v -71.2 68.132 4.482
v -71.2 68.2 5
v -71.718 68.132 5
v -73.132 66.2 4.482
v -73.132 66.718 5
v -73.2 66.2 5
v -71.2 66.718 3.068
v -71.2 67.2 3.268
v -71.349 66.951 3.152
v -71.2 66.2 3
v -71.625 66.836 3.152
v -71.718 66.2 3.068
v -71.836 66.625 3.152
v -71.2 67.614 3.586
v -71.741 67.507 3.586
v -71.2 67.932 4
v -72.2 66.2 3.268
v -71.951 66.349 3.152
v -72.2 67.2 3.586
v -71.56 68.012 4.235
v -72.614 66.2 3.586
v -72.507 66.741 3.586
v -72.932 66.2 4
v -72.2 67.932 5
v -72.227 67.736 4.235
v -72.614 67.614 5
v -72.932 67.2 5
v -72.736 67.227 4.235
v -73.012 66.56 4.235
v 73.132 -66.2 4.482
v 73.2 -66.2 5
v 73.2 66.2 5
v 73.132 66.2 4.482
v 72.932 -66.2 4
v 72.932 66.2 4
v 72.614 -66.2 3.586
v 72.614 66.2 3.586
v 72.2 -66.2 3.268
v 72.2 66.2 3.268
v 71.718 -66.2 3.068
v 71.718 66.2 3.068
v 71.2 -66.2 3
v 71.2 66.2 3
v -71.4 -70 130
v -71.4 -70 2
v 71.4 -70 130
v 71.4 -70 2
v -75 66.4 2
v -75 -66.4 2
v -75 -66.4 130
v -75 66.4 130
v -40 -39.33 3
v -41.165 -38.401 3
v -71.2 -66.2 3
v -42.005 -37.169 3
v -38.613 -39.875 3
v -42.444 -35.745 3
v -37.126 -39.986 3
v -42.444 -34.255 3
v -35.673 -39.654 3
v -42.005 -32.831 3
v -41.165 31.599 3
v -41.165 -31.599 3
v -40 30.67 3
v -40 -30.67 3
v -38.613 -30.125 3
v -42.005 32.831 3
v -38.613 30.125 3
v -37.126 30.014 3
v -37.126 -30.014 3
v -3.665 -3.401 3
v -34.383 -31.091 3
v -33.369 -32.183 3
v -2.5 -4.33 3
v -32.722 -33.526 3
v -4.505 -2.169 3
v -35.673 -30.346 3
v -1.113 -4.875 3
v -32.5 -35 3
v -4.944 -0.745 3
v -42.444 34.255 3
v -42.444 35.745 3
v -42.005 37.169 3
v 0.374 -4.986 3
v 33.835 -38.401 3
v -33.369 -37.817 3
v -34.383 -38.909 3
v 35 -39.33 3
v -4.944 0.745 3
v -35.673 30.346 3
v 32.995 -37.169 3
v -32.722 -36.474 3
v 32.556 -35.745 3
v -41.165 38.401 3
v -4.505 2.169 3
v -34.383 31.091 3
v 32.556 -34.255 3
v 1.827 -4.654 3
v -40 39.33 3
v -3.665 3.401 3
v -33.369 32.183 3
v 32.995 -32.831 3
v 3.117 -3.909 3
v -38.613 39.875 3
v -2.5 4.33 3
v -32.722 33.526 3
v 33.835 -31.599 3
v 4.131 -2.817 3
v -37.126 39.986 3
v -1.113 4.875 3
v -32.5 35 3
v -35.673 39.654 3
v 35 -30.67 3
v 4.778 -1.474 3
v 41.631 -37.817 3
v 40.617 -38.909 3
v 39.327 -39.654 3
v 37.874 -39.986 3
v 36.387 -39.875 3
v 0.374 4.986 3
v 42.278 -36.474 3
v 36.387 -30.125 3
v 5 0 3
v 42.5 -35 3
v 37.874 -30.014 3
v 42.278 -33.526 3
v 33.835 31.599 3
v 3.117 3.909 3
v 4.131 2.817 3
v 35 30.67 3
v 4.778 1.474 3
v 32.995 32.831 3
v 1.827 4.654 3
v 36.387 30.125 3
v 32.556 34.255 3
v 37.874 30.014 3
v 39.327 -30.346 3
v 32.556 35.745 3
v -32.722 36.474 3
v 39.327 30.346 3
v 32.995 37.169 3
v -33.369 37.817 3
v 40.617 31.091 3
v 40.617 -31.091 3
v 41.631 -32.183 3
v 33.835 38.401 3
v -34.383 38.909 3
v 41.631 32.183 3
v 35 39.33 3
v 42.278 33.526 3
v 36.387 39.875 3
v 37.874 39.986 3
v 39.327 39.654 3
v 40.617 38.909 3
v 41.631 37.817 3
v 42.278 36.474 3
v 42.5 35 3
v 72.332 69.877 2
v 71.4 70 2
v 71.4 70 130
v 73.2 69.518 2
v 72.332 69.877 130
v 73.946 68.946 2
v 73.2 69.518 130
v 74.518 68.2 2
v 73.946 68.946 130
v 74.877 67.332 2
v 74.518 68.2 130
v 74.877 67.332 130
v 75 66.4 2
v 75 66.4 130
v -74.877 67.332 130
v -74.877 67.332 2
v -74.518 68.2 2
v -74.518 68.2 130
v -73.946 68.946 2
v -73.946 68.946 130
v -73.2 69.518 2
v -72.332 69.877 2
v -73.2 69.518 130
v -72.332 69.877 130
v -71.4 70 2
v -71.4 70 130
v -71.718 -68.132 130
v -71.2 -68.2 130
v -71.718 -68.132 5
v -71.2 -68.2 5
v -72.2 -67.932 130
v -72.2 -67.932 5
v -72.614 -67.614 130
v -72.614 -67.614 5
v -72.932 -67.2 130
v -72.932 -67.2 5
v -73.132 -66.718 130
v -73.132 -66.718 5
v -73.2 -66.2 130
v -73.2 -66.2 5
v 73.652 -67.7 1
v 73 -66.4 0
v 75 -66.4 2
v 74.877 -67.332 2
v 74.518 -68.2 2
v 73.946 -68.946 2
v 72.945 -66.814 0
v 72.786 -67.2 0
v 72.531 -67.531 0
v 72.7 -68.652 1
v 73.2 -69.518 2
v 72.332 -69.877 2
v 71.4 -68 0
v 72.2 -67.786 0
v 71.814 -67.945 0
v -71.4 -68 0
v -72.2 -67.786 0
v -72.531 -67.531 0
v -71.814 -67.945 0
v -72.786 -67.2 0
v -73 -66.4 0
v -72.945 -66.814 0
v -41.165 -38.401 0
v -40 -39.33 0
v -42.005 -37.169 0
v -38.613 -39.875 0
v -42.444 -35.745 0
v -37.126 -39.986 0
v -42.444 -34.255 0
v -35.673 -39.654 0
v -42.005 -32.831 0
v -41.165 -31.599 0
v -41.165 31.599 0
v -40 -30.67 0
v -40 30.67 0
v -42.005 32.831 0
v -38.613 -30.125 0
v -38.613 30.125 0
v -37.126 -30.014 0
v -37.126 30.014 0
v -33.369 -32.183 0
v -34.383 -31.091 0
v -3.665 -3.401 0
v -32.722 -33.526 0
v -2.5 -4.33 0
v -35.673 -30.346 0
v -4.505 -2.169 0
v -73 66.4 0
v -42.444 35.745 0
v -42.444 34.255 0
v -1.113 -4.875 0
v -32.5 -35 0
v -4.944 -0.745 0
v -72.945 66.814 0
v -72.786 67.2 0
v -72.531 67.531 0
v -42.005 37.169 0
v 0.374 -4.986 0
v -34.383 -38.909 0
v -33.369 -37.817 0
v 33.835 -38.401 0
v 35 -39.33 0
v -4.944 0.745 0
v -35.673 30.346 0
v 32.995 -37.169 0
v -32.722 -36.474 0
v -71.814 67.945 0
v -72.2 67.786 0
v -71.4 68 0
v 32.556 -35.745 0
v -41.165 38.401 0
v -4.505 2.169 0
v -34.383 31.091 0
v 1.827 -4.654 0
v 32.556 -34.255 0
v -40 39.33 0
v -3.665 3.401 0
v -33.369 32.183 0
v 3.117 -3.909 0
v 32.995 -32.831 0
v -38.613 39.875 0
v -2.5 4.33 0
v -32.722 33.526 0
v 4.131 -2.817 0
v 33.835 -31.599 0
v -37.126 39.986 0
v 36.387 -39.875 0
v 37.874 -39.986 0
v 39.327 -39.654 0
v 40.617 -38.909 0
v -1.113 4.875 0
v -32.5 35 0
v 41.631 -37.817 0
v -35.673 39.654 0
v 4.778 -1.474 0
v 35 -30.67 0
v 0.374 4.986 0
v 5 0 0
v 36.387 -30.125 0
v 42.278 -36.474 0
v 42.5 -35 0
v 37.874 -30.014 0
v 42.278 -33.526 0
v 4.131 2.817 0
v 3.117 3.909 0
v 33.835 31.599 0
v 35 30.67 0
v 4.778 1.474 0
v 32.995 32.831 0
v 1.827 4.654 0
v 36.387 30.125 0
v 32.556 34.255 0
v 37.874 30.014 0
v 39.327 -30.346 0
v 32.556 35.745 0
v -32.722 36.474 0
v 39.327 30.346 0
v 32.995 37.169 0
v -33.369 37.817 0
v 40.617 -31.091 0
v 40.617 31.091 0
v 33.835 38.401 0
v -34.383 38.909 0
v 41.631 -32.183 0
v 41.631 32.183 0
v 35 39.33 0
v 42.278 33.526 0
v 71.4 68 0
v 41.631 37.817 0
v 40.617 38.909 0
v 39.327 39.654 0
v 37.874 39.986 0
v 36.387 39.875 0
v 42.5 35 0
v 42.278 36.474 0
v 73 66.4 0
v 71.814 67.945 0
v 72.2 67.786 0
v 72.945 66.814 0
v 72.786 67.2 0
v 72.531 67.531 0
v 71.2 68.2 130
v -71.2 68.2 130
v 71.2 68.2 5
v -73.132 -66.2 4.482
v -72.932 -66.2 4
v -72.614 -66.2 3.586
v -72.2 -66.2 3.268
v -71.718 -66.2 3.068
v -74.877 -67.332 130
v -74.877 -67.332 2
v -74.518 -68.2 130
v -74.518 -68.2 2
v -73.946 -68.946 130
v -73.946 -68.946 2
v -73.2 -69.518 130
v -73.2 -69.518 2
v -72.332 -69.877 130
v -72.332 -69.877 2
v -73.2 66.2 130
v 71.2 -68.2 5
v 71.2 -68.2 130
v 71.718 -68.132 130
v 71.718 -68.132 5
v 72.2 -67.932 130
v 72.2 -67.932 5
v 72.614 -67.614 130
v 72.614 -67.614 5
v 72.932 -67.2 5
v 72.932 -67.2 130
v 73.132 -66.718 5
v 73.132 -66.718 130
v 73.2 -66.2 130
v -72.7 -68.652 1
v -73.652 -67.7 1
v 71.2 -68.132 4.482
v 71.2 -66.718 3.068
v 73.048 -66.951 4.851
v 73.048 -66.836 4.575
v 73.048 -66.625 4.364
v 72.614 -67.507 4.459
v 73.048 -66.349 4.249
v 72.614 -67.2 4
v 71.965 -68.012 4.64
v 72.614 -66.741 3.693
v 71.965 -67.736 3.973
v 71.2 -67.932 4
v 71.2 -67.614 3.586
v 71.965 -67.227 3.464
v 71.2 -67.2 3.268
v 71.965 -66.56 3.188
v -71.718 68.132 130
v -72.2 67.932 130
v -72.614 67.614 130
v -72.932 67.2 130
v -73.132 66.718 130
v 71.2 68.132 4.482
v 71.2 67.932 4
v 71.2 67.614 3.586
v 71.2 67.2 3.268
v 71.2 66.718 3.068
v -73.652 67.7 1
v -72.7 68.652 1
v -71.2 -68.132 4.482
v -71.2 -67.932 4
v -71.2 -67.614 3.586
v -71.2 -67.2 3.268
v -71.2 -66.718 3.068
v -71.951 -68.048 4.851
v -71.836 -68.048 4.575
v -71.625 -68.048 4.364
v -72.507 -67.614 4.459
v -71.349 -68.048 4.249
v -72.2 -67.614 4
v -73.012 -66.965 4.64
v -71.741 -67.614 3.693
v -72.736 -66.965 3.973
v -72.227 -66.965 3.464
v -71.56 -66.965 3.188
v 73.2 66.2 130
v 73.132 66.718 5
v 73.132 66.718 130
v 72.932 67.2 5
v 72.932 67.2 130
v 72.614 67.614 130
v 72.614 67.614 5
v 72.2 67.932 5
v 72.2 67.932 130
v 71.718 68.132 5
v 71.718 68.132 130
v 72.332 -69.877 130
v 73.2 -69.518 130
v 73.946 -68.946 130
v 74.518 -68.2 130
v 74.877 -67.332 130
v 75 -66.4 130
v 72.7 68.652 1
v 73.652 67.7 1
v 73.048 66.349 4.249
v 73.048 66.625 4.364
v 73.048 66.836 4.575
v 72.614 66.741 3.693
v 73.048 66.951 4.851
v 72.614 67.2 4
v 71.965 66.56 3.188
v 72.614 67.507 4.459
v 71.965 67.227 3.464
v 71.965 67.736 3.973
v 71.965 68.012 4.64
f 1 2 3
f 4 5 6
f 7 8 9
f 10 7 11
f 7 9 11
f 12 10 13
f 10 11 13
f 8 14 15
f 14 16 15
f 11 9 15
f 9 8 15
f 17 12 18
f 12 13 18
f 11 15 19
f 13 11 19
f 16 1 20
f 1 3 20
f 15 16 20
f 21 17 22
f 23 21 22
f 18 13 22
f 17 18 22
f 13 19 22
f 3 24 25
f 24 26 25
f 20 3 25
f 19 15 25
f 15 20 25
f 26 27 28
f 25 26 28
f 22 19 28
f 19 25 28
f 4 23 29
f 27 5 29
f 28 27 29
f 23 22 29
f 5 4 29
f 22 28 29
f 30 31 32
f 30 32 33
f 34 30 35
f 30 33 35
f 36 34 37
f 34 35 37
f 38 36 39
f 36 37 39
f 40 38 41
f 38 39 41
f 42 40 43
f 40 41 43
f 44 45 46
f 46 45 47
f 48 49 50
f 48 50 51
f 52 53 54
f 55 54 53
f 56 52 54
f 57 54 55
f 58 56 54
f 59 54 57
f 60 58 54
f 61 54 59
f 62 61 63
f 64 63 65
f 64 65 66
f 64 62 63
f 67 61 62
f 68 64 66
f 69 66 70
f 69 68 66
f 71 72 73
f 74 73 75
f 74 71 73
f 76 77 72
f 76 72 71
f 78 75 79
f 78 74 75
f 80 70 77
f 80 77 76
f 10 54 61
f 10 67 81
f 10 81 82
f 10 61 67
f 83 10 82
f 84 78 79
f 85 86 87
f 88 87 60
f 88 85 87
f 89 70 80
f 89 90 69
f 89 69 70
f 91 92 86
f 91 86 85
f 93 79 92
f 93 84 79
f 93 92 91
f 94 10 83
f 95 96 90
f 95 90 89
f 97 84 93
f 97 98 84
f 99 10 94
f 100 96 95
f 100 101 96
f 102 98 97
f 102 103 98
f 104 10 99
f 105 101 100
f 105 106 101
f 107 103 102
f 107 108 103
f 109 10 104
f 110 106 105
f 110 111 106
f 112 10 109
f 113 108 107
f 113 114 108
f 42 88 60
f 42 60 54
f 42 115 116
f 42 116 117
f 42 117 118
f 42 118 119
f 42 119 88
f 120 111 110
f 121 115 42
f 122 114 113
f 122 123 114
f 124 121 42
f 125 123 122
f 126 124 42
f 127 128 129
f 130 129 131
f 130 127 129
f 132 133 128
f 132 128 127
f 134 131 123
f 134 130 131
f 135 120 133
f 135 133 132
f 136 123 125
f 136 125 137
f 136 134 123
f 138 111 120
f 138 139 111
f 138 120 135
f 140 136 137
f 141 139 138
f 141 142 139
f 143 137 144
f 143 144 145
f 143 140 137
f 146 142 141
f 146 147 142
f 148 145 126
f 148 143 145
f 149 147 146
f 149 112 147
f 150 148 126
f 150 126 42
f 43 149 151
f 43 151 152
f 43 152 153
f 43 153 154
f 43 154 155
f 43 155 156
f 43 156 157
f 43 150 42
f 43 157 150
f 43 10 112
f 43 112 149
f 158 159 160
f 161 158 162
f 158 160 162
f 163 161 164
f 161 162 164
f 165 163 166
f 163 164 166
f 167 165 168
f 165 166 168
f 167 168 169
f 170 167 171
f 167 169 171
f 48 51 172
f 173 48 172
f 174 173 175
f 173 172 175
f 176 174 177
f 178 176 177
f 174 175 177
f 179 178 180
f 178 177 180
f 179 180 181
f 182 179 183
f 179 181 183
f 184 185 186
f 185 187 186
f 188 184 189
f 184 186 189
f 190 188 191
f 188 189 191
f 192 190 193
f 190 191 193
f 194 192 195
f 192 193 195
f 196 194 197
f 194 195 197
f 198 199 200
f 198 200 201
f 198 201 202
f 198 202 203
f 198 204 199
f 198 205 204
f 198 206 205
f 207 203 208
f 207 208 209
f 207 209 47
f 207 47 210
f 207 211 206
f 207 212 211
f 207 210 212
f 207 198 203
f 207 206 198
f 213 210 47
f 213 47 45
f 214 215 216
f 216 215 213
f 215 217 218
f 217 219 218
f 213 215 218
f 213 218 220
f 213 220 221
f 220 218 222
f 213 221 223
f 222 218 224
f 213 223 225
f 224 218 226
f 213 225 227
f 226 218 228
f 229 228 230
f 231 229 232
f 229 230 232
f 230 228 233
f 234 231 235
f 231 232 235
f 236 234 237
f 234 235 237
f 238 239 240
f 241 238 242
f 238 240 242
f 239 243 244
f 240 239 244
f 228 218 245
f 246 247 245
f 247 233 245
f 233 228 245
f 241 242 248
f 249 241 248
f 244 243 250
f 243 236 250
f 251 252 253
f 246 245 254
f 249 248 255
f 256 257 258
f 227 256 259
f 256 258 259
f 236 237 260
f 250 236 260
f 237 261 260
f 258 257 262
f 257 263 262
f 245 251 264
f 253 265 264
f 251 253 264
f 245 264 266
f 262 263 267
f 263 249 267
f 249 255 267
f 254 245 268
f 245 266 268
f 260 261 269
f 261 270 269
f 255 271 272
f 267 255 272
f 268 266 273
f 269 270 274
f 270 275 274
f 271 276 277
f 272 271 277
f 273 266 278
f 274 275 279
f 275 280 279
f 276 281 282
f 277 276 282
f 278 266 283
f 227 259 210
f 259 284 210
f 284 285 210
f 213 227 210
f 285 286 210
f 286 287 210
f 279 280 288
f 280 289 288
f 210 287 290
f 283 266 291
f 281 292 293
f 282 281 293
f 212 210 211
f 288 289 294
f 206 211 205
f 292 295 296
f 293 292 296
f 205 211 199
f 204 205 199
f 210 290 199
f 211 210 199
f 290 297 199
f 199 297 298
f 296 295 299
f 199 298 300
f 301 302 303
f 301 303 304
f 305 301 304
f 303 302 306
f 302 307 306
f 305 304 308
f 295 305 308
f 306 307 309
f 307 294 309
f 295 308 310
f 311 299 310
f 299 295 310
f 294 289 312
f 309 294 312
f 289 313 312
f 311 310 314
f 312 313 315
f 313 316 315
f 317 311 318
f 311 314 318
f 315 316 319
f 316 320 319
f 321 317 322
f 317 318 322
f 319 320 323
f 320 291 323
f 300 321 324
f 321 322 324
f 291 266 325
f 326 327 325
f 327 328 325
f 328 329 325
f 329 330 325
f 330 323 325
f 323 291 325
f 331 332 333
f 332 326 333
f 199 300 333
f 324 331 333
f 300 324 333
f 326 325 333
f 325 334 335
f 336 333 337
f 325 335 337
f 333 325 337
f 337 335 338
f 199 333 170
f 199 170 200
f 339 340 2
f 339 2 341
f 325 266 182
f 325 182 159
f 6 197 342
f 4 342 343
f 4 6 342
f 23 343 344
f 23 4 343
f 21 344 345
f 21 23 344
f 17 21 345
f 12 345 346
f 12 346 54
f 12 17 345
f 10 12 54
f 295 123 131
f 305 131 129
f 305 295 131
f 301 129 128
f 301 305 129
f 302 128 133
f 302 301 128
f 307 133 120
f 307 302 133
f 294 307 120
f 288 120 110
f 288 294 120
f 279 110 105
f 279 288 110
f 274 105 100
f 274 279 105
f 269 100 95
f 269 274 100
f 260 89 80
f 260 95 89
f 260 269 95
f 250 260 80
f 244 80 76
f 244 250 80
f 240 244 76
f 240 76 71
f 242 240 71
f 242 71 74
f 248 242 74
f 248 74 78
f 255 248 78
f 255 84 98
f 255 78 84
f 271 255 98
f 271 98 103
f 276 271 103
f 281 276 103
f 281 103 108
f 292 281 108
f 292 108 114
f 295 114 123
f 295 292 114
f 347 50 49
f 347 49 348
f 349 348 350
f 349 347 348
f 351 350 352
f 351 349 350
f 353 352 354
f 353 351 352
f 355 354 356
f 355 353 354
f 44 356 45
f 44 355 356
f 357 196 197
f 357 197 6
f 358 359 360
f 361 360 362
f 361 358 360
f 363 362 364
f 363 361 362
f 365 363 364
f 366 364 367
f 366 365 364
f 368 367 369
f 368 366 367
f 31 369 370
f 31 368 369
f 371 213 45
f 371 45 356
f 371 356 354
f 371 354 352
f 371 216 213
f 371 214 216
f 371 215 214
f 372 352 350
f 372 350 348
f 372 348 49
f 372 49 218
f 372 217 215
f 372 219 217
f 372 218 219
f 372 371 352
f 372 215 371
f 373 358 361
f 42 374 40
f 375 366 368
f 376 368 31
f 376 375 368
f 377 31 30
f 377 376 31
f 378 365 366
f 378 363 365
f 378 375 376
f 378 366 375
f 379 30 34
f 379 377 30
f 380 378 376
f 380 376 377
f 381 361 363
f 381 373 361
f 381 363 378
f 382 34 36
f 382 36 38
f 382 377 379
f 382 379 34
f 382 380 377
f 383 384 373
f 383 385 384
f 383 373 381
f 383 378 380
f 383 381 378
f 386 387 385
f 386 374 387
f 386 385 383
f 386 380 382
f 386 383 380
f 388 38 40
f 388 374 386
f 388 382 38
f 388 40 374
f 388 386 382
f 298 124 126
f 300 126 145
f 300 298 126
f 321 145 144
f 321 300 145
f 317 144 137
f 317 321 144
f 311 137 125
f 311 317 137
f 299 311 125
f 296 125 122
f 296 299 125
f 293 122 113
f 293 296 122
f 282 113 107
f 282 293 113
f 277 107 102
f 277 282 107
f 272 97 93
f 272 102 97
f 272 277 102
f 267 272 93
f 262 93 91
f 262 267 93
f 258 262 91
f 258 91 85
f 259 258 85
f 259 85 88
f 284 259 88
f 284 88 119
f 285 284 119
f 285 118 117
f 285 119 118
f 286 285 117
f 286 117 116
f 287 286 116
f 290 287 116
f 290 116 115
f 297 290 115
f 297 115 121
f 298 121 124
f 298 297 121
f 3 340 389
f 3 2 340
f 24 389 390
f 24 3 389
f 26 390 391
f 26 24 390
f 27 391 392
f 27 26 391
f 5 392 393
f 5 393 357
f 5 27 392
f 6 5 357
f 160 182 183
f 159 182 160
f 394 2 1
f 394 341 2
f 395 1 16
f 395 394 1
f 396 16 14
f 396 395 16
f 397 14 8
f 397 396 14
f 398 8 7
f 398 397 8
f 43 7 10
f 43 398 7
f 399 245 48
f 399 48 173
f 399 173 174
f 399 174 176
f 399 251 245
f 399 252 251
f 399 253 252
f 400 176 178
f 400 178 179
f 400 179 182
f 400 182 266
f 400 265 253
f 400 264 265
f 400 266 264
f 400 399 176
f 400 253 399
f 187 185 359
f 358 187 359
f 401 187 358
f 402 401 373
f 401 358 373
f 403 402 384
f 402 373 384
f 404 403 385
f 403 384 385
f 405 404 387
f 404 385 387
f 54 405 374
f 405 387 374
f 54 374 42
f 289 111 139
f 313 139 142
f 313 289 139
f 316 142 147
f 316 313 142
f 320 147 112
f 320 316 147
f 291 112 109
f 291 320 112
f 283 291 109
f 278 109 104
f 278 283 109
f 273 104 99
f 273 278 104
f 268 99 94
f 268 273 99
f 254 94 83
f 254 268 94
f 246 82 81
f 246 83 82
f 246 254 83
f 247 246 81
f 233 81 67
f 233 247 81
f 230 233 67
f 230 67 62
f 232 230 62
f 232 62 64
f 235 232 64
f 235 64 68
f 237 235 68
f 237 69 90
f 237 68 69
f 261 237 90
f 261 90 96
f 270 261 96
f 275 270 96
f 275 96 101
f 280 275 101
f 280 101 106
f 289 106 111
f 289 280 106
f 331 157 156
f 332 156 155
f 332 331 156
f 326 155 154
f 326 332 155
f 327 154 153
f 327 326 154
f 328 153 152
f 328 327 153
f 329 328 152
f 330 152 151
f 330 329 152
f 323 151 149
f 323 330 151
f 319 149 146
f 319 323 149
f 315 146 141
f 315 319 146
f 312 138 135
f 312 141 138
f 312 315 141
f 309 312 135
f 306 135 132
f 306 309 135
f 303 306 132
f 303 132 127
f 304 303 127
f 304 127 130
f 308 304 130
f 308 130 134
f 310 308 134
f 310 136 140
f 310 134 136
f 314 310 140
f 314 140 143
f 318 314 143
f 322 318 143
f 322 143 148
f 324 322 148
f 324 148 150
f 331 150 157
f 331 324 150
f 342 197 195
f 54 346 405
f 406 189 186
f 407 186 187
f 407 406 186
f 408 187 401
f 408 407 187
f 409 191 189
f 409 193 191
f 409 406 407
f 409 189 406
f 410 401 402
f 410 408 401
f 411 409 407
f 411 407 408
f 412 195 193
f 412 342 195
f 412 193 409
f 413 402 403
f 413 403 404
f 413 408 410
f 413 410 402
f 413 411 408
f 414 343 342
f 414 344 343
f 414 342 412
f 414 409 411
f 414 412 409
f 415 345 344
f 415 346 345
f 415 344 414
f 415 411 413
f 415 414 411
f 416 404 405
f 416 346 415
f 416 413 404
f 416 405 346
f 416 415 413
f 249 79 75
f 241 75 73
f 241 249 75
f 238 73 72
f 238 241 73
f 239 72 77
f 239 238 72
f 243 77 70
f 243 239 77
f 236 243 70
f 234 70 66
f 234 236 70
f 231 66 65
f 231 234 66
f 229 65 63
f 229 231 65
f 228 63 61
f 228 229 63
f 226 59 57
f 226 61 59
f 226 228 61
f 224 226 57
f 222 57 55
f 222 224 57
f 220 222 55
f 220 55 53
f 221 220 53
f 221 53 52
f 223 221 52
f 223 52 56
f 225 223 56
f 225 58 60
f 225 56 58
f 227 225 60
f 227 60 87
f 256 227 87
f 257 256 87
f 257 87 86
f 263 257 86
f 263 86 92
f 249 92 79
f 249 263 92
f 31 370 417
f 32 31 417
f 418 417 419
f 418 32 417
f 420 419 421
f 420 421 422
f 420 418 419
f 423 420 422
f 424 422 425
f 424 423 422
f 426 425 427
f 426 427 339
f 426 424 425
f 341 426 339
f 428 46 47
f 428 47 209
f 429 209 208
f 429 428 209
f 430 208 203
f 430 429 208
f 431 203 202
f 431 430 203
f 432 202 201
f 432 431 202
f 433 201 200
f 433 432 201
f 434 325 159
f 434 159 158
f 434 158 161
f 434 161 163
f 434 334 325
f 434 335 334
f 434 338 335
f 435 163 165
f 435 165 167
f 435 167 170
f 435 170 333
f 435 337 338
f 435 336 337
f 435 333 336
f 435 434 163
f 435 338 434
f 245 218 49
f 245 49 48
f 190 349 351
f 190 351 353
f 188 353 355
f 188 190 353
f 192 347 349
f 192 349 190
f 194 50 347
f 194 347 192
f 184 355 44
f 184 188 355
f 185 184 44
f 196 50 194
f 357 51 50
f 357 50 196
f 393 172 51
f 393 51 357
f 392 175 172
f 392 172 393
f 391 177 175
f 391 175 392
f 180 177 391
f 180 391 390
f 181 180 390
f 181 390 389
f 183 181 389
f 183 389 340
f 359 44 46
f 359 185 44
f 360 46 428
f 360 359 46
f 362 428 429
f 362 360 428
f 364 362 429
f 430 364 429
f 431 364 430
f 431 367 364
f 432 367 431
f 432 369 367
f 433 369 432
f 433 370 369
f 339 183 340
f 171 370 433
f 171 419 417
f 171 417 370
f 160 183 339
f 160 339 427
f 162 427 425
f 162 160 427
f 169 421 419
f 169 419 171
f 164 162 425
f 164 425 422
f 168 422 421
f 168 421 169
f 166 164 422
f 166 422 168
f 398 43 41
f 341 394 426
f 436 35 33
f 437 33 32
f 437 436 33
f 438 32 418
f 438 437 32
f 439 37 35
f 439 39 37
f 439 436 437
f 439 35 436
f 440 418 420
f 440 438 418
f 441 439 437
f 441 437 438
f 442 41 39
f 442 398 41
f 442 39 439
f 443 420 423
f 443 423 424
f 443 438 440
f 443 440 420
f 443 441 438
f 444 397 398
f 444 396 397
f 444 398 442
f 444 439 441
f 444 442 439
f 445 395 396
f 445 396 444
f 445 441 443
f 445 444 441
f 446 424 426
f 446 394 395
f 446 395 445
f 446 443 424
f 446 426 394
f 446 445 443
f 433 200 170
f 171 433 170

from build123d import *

# Parameters (mm, degrees)
SKETCH_W        = 150
SKETCH_H        = 140
PAD_DEPTH       = 130
SKETCH001_W     = 146.4
SKETCH001_H     = 136.4
POCKET_DEPTH    = 127
SKETCH002_R     = 5
POCKET001_DEPTH = 130.001
FILLET_R        = 2
FILLET001_R     = 3.6
CHAMFER_SIZE    = 2


with BuildPart() as part:
    # Sketch → Pad (new body)
    with BuildSketch(Plane.XY):
        Rectangle(SKETCH_W, SKETCH_H)
    extrude(amount=PAD_DEPTH)

    # Sketch001 (on DatumPlane) → Pocket (cut)
    with BuildSketch(Plane.XY.offset(130)):
        Rectangle(SKETCH001_W, SKETCH001_H)
    extrude(amount=-POCKET_DEPTH, mode=Mode.SUBTRACT)

    # Sketch002 → Pocket001 (cut, through all)
    with BuildSketch(Plane.XY):
        with Locations((-37.5, 35)):
            Circle(SKETCH002_R)
        with Locations((37.5, 35)):
            Circle(SKETCH002_R)
        with Locations((37.5, -35)):
            Circle(SKETCH002_R)
        with Locations((-37.5, -35)):
            Circle(SKETCH002_R)
        Circle(SKETCH002_R)
    extrude(amount=POCKET001_DEPTH, mode=Mode.SUBTRACT)

    # Fillet
    fillet_edges = [part.edges().sort_by_distance(p)[0] for p in [
        (-73.2, 68.2, 66.5),
        (0, 68.2, 3),
        (-73.2, 0, 3),
        (-73.2, -68.2, 66.5),
        (0, -68.2, 3),
        (73.2, -68.2, 66.5),
        (73.2, 0, 3),
        (73.2, 68.2, 66.5),
    ]]
    fillet(fillet_edges, radius=FILLET_R)

    # Fillet001
    fillet001_edges = [part.edges().sort_by_distance(p)[0] for p in [
        (-75, -70, 65),
        (75, -70, 65),
        (75, 70, 65),
        (-75, 70, 65),
    ]]
    fillet(fillet001_edges, radius=FILLET001_R)

    # Chamfer
    chamfer_edges = [part.edges().sort_by_distance(p)[0] for p in [
        (0, 70, 0),
    ]]
    chamfer(chamfer_edges, length=CHAMFER_SIZE)


solid = part.part
